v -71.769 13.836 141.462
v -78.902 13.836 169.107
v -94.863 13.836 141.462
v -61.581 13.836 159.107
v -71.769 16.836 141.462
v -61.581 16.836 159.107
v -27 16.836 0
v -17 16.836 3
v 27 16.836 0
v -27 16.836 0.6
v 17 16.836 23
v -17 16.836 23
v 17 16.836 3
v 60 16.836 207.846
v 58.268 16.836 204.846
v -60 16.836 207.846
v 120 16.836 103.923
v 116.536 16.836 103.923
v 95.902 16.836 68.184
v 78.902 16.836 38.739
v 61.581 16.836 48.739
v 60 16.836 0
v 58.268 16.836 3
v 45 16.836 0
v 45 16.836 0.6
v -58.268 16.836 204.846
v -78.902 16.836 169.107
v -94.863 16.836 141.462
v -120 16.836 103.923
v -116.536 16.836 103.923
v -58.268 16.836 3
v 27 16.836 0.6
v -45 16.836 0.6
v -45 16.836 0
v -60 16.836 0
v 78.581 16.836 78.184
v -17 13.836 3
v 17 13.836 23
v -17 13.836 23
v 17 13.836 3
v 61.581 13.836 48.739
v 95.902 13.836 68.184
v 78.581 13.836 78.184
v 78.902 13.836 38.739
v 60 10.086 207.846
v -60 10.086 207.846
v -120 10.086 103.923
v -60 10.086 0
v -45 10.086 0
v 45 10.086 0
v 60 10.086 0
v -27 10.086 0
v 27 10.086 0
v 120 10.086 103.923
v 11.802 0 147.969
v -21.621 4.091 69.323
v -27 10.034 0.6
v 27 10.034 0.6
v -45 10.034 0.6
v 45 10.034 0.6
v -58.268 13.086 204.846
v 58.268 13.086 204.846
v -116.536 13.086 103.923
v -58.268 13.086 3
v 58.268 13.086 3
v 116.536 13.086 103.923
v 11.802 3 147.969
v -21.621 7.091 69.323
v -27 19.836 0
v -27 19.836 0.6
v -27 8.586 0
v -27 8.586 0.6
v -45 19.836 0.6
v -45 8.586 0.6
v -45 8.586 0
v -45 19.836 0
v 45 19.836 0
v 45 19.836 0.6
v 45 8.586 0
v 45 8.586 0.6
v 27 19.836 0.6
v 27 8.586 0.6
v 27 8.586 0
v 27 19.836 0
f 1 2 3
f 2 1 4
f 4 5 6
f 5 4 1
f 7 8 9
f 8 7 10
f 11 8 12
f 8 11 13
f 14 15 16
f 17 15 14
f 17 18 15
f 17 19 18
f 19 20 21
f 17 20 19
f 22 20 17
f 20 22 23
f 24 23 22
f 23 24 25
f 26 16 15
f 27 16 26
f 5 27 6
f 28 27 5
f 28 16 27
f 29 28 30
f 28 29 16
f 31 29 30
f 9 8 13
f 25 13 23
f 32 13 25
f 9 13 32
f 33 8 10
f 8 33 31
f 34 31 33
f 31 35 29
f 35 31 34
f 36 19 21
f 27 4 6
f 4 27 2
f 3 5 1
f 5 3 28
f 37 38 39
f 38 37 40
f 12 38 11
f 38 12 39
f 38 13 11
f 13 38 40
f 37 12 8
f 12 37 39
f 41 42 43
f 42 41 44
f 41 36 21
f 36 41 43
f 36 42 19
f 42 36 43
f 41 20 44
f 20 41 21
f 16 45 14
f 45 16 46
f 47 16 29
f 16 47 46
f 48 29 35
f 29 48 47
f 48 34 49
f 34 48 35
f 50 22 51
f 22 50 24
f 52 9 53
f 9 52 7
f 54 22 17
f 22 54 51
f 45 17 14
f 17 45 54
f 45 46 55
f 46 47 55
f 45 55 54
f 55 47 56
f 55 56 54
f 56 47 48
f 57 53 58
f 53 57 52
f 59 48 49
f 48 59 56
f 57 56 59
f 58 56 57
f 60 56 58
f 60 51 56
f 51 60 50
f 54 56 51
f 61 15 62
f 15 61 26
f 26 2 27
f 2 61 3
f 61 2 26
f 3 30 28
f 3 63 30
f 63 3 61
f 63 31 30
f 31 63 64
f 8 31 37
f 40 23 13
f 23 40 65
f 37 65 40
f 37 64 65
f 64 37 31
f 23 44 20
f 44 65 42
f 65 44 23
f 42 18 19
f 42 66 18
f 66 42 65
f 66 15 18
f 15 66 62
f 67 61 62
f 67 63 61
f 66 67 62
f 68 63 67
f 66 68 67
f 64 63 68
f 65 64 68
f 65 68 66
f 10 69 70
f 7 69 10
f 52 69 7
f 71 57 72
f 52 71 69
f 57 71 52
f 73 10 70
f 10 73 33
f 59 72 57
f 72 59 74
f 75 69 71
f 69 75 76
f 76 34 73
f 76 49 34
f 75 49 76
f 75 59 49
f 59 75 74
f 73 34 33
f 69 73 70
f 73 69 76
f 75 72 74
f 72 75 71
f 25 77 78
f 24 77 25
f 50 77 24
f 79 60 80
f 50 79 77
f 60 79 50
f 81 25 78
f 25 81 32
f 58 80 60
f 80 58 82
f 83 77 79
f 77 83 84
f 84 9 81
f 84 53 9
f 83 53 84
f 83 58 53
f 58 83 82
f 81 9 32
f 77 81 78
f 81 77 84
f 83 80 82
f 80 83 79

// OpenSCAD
/*
    parametric_faceted_hex_wall_tile_mount_v29_self_supporting_mounts.scad
    ----------------------------------------------------------------
    Regular asymmetric low-poly hex wall tile.

    v29 goals
    ---------
    1. Multi-object plate packing is the default design target.
    2. Preserve a TRUE regular hexagon -- no X/Y stretching.
    3. Default maximum corner-to-corner width = 240 mm / 9.449 in.
    4. Vertical export rests on a complete flat hex side, not a point.
    5. Open back remains fully open.
    6. Hidden mounting pads remain clipped below the visible face.
    7. One master thickness controls shell, perimeter, and pads.
    8. Integrated low-profile sacrificial stabilizer feet are enabled by default.
    9. Mounting pads are automatically beveled for the selected vertical
       orientation so their first printed layer begins at the perimeter wall.
    10. This removes the need for tall fins or diagonal sacrificial gussets.
    11. The rear mounting surface remains flat; only the pad footprint is trimmed
        where needed to eliminate print-island starts.

    Recommended default
    -------------------
    face_size_reference      = "across_corners";
    face_size_units          = "mm";
    face_size                = 240.0;   // 9.449" maximum width

    tile_rotation_deg        = 15;

    export_orientation       = "vertical";
    vertical_edge_angle_deg  = 15;      // flat side on build plate

    master_thickness_mm      = 3.0;
    add_mount_pads           = true;
    add_mount_ribs           = false;

    // Multi-copy stability:
    add_vertical_breakaway_feet = true;
    vertical_foot_depth_mm       = 5.0;
    vertical_foot_height_mm      = 0.60;
    vertical_foot_neck_mm        = 0.80;

    Export
    ------
    F6 Render
    File -> Export -> Export as STL
*/


// =============================================================================
// CUSTOMIZER PARAMETERS
// =============================================================================


/* [Finished Face Size] */

// "bounding_square"
//     face_size is the maximum X and Y envelope.
//
// "flat_to_flat"
//     face_size is the traditional hex flat-to-flat dimension.
//
// "across_corners"
//     face_size is the regular-hex corner-to-corner dimension.
//
// v29 DEFAULT:
// across_corners = 240 mm so the vertically printed tile is about:
//     X = 240.0 mm
//     Z = 207.85 mm
// while resting on a complete flat edge.
face_size_reference = "across_corners"; // [bounding_square, flat_to_flat, across_corners]

// Units used by face_size.
face_size_units = "mm";                   // [mm, in]

// Default = 240 mm / 9.449 in maximum corner-to-corner width.
// This leaves useful X-axis margin on a 256 mm plate.
face_size = 240.0;

// Rotation of the finished hex within its face plane.
//
// IMPORTANT:
// 15 degrees gives a regular hex an equal X/Y bounding envelope.
// With bounding_square + 254 mm this produces approximately:
//     X = 254.0 mm
//     Y = 254.0 mm
tile_rotation_deg = 15;


/* [Export / Print Orientation] */

// "flat"     = conventional CAD orientation; decorative face points +Z.
// "vertical" = rotate final part onto an edge for vertical printing.
export_orientation = "vertical";          // [flat, vertical]

// Additional in-plane rotation used ONLY before standing the part vertically.
//
// IMPORTANT:
// The finished face uses tile_rotation_deg = 15 so its X/Y envelope is exactly
// square. A regular hex rests on a FLAT SIDE when its effective print-plane
// rotation is 30 degrees (modulo 60 degrees).
//
// Therefore the default vertical export adds another 15 degrees:
//
//     15 deg finished-face rotation
//   + 15 deg vertical export rotation
//   = 30 deg effective print rotation
//
// This puts a complete flat hex side on the build plate instead of a point.
// The transformed model is automatically translated so that side rests at Z=0.
// Rotate the finished 15-degree face orientation another 15 degrees before
// standing it up. 15 + 15 = 30 degrees, which places a complete hex side
// horizontally at the bottom rather than balancing the tile on a vertex.
vertical_edge_angle_deg = 15;

// Add small breakaway stabilizer feet after the model is stood vertically.
// Normally leave OFF and use a slicer brim if required.
add_vertical_breakaway_feet = true;

// Breakaway-foot dimensions.
vertical_foot_length_mm = 18.0;
vertical_foot_depth_mm = 5.0;
vertical_foot_height_mm = 0.60;
vertical_foot_neck_mm = 0.80;


/* [MASTER THICKNESS] */

// Main material thickness control.
master_thickness_mm = 3.0;

// Optional tuning multipliers.
front_shell_multiplier = 1.0;
perimeter_multiplier   = 1.0;
mount_pad_multiplier   = 1.0;


/* [Front Relief] */

// "proportional" scales relief with the true flat-to-flat dimension.
// "absolute" uses explicit millimeter values.
relief_height_mode = "proportional";      // [proportional, absolute]

relief_scale = 1.0;

// Relative relief proportions.
peak_height_ratio = 0.081;
ridge_to_peak_ratio = 0.757;
edge_to_peak_ratio = 0.097;

// Used only in absolute mode.
peak_height_mm   = 18.5;
ridge_height_mm = 14.0;
edge_height_mm  = 1.8;

// Minimum air gap between inner roof and mounting geometry.
edge_clearance_mm = 0.60;


/* [Facet Layout] */

peak_angle_deg = 45;
peak_radius_ratio = 0.38;

ridge_angle_deg = 208;
ridge_radius_ratio = 0.34;


/* [Wall Mounting] */

add_mount_pads = true;

// Width parallel to local hex edge.
mount_pad_width_mm = 34.0;

// Radial depth into the cavity.
mount_pad_depth_mm = 24.0;

// Structural overlap beneath the inner perimeter shell.
mount_pad_overlap_mm = 4.0;

// Pull mounting geometry inward from the visible outside perimeter.
 // Keep this smaller than the perimeter-wall thickness so the pad still
 // overlaps the wall by a positive amount.
// IMPORTANT:
 // Must be LESS than perimeter_wall_thickness_mm so the pads physically
 // overlap the perimeter wall and become one connected solid.
 mount_pad_edge_inset_mm = 0.5;

// Clearance below underside of visible face.
mount_face_clearance_mm = 0.75;

// Mount-pad directions in the tile's local coordinate system.
mount_pad_angles = [60, 120, 240, 300];


/* [Mount Reinforcement] */

add_mount_ribs = false;

mount_rib_width_mm  = 3.0;
mount_rib_height_mm = 5.0;
mount_rib_depth_mm  = 8.0;


/* [Optional Screw Holes] */

add_pad_screw_holes = false;

pad_screw_hole_diameter_mm = 4.5;



/* [Plate Packing Guidance] */

// These values do NOT duplicate objects inside the STL.
// They provide planning numbers in the OpenSCAD console for arranging
// multiple copies in the slicer.
//
// Typical X2D-style plate planning:
//   usable Y = 256 mm
//   keep a conservative front/rear margin
plate_depth_mm = 256.0;

plate_front_margin_mm = 8.0;
plate_rear_margin_mm  = 8.0;

// Recommended empty gap between adjacent standing tiles.
// Increase if using aggressive acceleration or if the printer has noticeable
// resonance/wobble on tall parts.
recommended_inter_tile_gap_mm = 8.0;

// Feet extend from Y=0 to vertical_foot_depth_mm.
// The actual tile relief occupies approximately peak_height in Y.
// Packing pitch uses whichever is deeper, plus the inter-tile gap.


/* [Vertical Self-Supporting Mount Pads] */

// Recommended ON for vertical printing.
//
// Each rectangular mounting-pad footprint is clipped by a print-height
// half-space. The cut removes only the portion that would begin below the
// pad's wall-connected outer edge. As a result, every pad grows outward from
// the already-printing perimeter rather than appearing as a mid-air island.
make_mount_pads_vertical_self_supporting = true;

// Small amount below the wall-connected outer-edge start height that is kept.
// 0.20 mm is approximately one standard layer and helps guarantee overlap.
mount_pad_print_safety_mm = 0.20;

// Large half-space size used only for clipping.
print_halfspace_size_mm = 1000.0;


/* [Vertical Anti-Float Gussets] */

// Some mounting pads begin above the build plate when the tile is printed
// vertically. Instead of a tall free-standing fin, v28 generates a short,
// diagonal sacrificial gusset from the already-printed perimeter wall toward
// the lowest corner of each affected pad.
//
// The gusset:
// - stays inside the rear cavity
// - is thin in Y for easy removal
// - grows from the shell toward the pad
// - is generated only for pads that would otherwise start as an island
add_vertical_antifloat_gussets = false;

// Thin sacrificial thickness into the cavity.
antifloat_gusset_thickness_mm = 0.70;

// How far the gusset extends into the pad for reliable layer connection.
antifloat_gusset_pad_overlap_mm = 1.50;

// Vertical distance below the first pad layer used for the shell-side anchor.
// A 30 mm drop keeps the diagonal print angle conservative while remaining
// dramatically shorter than the previous full-height support fins.
antifloat_gusset_drop_mm = 30.0;

// Height of the short attachment edge against the perimeter wall.
antifloat_gusset_wall_base_mm = 5.0;

// Keep the wall anchor slightly inside the visible outer perimeter.
antifloat_gusset_wall_inset_mm = 1.5;

// Ignore a pad if its lowest point is already essentially on the build plate.
antifloat_min_height_mm = 0.80;


/* [Advanced] */

polyhedron_convexity = 12;
screw_hole_fn = 40;

// Small numerical tolerance.
eps = 0.01;


// =============================================================================
// HELPERS
// =============================================================================

function polar(angle_deg, radius) =
    [
        radius * cos(angle_deg),
        radius * sin(angle_deg)
    ];

function hex_vertex_unrotated(i, radius) =
    [
        radius * cos(30 + i * 60),
        radius * sin(30 + i * 60)
    ];

function rotate2d(p, angle_deg) =
    [
        p[0] * cos(angle_deg) - p[1] * sin(angle_deg),
        p[0] * sin(angle_deg) + p[1] * cos(angle_deg)
    ];


// Position of a raw mount-pad corner after all in-plane rotations used by the
// vertical export. Returned as [final_X, final_Z] because after rotate X=90,
// original in-plane Y becomes print Z.
function mount_print_corner(angle_deg, radial_r, lateral_t) =
    let(
        theta =
            angle_deg
            + tile_rotation_deg
            + vertical_edge_angle_deg
    )
    [
        radial_r * cos(theta) - lateral_t * sin(theta),
        vertical_half_y
            + radial_r * sin(theta)
            + lateral_t * cos(theta)
    ];

function mount_print_corners(angle_deg) =
    [
        mount_print_corner(
            angle_deg,
            mount_pad_inner_r,
            -mount_pad_width_mm / 2
        ),
        mount_print_corner(
            angle_deg,
            mount_pad_inner_r,
             mount_pad_width_mm / 2
        ),
        mount_print_corner(
            angle_deg,
            mount_pad_desired_outer_r,
            -mount_pad_width_mm / 2
        ),
        mount_print_corner(
            angle_deg,
            mount_pad_desired_outer_r,
             mount_pad_width_mm / 2
        )
    ];

function mount_corner_z_values(angle_deg) =
    [
        for (p = mount_print_corners(angle_deg))
            p[1]
    ];

function mount_lowest_z(angle_deg) =
    min(mount_corner_z_values(angle_deg));

function mount_lowest_corner_index(angle_deg) =
    search(
        mount_lowest_z(angle_deg),
        mount_corner_z_values(angle_deg)
    )[0];

function mount_lowest_x(angle_deg) =
    mount_print_corners(angle_deg)[
        mount_lowest_corner_index(angle_deg)
    ][0];


function mount_outer_print_z_values(angle_deg) =
    [
        mount_print_corner(
            angle_deg,
            mount_pad_desired_outer_r,
            -mount_pad_width_mm / 2
        )[1],

        mount_print_corner(
            angle_deg,
            mount_pad_desired_outer_r,
             mount_pad_width_mm / 2
        )[1]
    ];

function mount_outer_lowest_z(angle_deg) =
    min(mount_outer_print_z_values(angle_deg));



// Half-width of the stood-up regular hex at a given print Z.
//
// In the default flat-side-down vertical orientation:
// - bottom/top edges are flat
// - maximum width is across corners
// - total print height is flat-to-flat
//
// This lets the sacrificial gusset anchor itself directly into the perimeter
// wall at the same side of the tile as the affected mounting pad.
function vertical_hex_half_width_at_z(z_mm) =
    let(
        zc = min(max(z_mm, 0), vertical_print_height),
        dz = min(zc, vertical_print_height - zc)
    )
    hex_side_length / 2 + dz / tan(60);

function hex_vertex(i, radius) =
    rotate2d(
        hex_vertex_unrotated(i, radius),
        tile_rotation_deg
    );

// Half-width / half-height of a unit-circumradius rotated regular hex.
function unit_hex_half_x(rotation_deg) =
    max([
        for (i = [0 : 5])
            abs(
                cos(30 + i * 60 + rotation_deg)
            )
    ]);

function unit_hex_half_y(rotation_deg) =
    max([
        for (i = [0 : 5])
            abs(
                sin(30 + i * 60 + rotation_deg)
            )
    ]);

// Bounding box of a regular hex with circumradius r.
function hex_bbox_x(r, rotation_deg) =
    2 * r * unit_hex_half_x(rotation_deg);

function hex_bbox_y(r, rotation_deg) =
    2 * r * unit_hex_half_y(rotation_deg);


// =============================================================================
// DERIVED MATERIAL THICKNESSES
// =============================================================================

front_shell_thickness_mm =
    master_thickness_mm * front_shell_multiplier;

perimeter_wall_thickness_mm =
    master_thickness_mm * perimeter_multiplier;

mount_pad_thickness_mm =
    master_thickness_mm * mount_pad_multiplier;


// =============================================================================
// DERIVED FACE DIMENSIONS
// =============================================================================

_face_size_mm =
    face_size_units == "in"
        ? face_size * 25.4
        : face_size;

// If bounding_square is selected, choose the largest regular-hex radius that
// fits inside both the requested X and Y dimensions.
//
// At tile_rotation_deg = 15, unit X and Y extents are equal, so both dimensions
// become exactly face_size.
r_outer =
    face_size_reference == "flat_to_flat"
        ? (_face_size_mm / 2) / cos(30)
        : face_size_reference == "across_corners"
            ? _face_size_mm / 2
            : min(
                _face_size_mm / (2 * unit_hex_half_x(tile_rotation_deg)),
                _face_size_mm / (2 * unit_hex_half_y(tile_rotation_deg))
              );

tile_flat_to_flat =
    2 * r_outer * cos(30);

tile_across_corners =
    2 * r_outer;

finished_bbox_x =
    hex_bbox_x(r_outer, tile_rotation_deg);

finished_bbox_y =
    hex_bbox_y(r_outer, tile_rotation_deg);

outer_apothem =
    tile_flat_to_flat / 2;

inner_apothem =
    outer_apothem - perimeter_wall_thickness_mm;

r_inner =
    inner_apothem / cos(30);

inner_flat_length =
    2 * inner_apothem * tan(30);

hex_side_length =
    r_outer;


// =============================================================================
// DERIVED RELIEF HEIGHTS
// =============================================================================

_peak_unscaled =
    relief_height_mode == "proportional"
        ? tile_flat_to_flat * peak_height_ratio
        : peak_height_mm;

_ridge_unscaled =
    relief_height_mode == "proportional"
        ? _peak_unscaled * ridge_to_peak_ratio
        : ridge_height_mm;

_requested_edge_unscaled =
    relief_height_mode == "proportional"
        ? _peak_unscaled * edge_to_peak_ratio
        : edge_height_mm;

peak_height =
    _peak_unscaled * relief_scale;

ridge_height =
    _ridge_unscaled * relief_scale;

requested_edge_height =
    _requested_edge_unscaled * relief_scale;

// Enough vertical room for front shell + complete pad + clearance.
minimum_edge_height =
    front_shell_thickness_mm
    + mount_pad_thickness_mm
    + mount_face_clearance_mm;

edge_height =
    max(
        requested_edge_height,
        minimum_edge_height
    );


// =============================================================================
// DERIVED MOUNTING GEOMETRY
// =============================================================================

mount_pad_desired_outer_r =
    inner_apothem + mount_pad_overlap_mm;

mount_pad_inner_r =
    mount_pad_desired_outer_r - mount_pad_depth_mm;

mount_pad_center_r =
    mount_pad_desired_outer_r - mount_pad_depth_mm / 2;

mount_clip_apothem =
    outer_apothem - mount_pad_edge_inset_mm;

mount_clip_radius =
    mount_clip_apothem / cos(30);


// =============================================================================
// VERTICAL-EXPORT DERIVED VALUES
// =============================================================================
//
// The tile is first rotated around Z by vertical_edge_angle_deg, then stood up
// by +90 degrees around X.
//
// We calculate the local Y envelope AFTER that optional Z rotation so the
// final model can be translated to put its lowest point exactly on Z=0.

vertical_rotation_total_deg =
    vertical_edge_angle_deg;

vertical_half_y =
    max([
        for (i = [0 : 5])
            abs(
                r_outer
                * sin(
                    30
                    + i * 60
                    + tile_rotation_deg
                    + vertical_rotation_total_deg
                )
            )
    ]);

vertical_print_height =
    2 * vertical_half_y;

// After rotate([90,0,0]), original +Z becomes -Y.
// Translate by peak_height so all relief lies in positive Y.
vertical_print_depth =
    peak_height;

// Multi-copy packing envelope in Y.
//
// vertical_tile() occupies approximately peak_height of Y-depth.
// Breakaway feet occupy vertical_foot_depth_mm.
// Use the larger dimension as the per-part physical depth.
vertical_object_depth =
    add_vertical_breakaway_feet
        ? vertical_print_depth + 3.0
        : vertical_print_depth;

recommended_copy_pitch_y =
    vertical_object_depth + recommended_inter_tile_gap_mm;

usable_plate_depth =
    plate_depth_mm
    - plate_front_margin_mm
    - plate_rear_margin_mm;

estimated_copies_per_plate_depth =
    max(
        1,
        floor(
            (
                usable_plate_depth
                + recommended_inter_tile_gap_mm
            )
            / recommended_copy_pitch_y
        )
    );


// =============================================================================
// VALIDATION
// =============================================================================

assert(
    _face_size_mm > 0,
    "face_size must produce a positive dimension."
);

assert(
    master_thickness_mm > 0,
    "master_thickness_mm must be greater than zero."
);

assert(
    front_shell_multiplier > 0
    && perimeter_multiplier > 0
    && mount_pad_multiplier > 0,
    "All thickness multipliers must be greater than zero."
);

assert(
    front_shell_thickness_mm > 0,
    "front_shell_thickness_mm must be greater than zero."
);

assert(
    perimeter_wall_thickness_mm > 0,
    "perimeter_wall_thickness_mm must be greater than zero."
);

assert(
    perimeter_wall_thickness_mm < outer_apothem,
    "perimeter_wall_thickness_mm is too large for this tile."
);

assert(
    inner_apothem > 0,
    "The selected perimeter wall leaves no hollow interior."
);

assert(
    edge_height > front_shell_thickness_mm,
    "Internal error: edge_height must exceed front_shell_thickness_mm."
);

assert(
    ridge_height > edge_height,
    "ridge_height must remain greater than the effective edge height."
);

assert(
    peak_height > ridge_height,
    "peak_height must remain greater than ridge_height."
);

assert(
    peak_radius_ratio > 0 && peak_radius_ratio < 0.90,
    "peak_radius_ratio must be between 0 and 0.90."
);

assert(
    ridge_radius_ratio > 0 && ridge_radius_ratio < 0.90,
    "ridge_radius_ratio must be between 0 and 0.90."
);

assert(
    mount_pad_width_mm > 0,
    "mount_pad_width_mm must be greater than zero."
);

assert(
    mount_pad_depth_mm > 0,
    "mount_pad_depth_mm must be greater than zero."
);

assert(
    mount_pad_thickness_mm > 0,
    "mount_pad_thickness_mm must be greater than zero."
);

assert(
    mount_pad_overlap_mm >= 0,
    "mount_pad_overlap_mm cannot be negative."
);

assert(
    mount_pad_edge_inset_mm >= 0,
    "mount_pad_edge_inset_mm cannot be negative."
);

assert(
    mount_pad_edge_inset_mm < perimeter_wall_thickness_mm,
    "mount_pad_edge_inset_mm must be smaller than perimeter_wall_thickness_mm so mounting pads overlap and join the perimeter wall."
);

assert(
    mount_face_clearance_mm >= 0,
    "mount_face_clearance_mm cannot be negative."
);

assert(
    mount_clip_apothem > 0,
    "mount_pad_edge_inset_mm is too large."
);

assert(
    mount_pad_inner_r > 0,
    "mount_pad_depth_mm is too large and reaches/passes the tile center."
);

assert(
    !add_pad_screw_holes
    || pad_screw_hole_diameter_mm < mount_pad_width_mm * 0.75,
    "pad_screw_hole_diameter_mm is too large for the mounting pad."
);

assert(
    !add_mount_ribs
    || mount_rib_height_mm > 0,
    "mount_rib_height_mm must be greater than zero."
);

assert(
    !add_vertical_breakaway_feet
    || export_orientation == "vertical",
    "Vertical breakaway feet require export_orientation = \"vertical\"."
);

assert(
    plate_depth_mm > 0,
    "plate_depth_mm must be greater than zero."
);

assert(
    plate_front_margin_mm >= 0
    && plate_rear_margin_mm >= 0,
    "Plate margins cannot be negative."
);

assert(
    recommended_inter_tile_gap_mm >= 0,
    "recommended_inter_tile_gap_mm cannot be negative."
);

assert(
    usable_plate_depth > 0,
    "Plate margins leave no usable plate depth."
);


assert(
    antifloat_gusset_thickness_mm > 0
    && antifloat_gusset_thickness_mm <= mount_pad_thickness_mm,
    "antifloat_gusset_thickness_mm must be > 0 and no thicker than the mounting pad."
);

assert(
    antifloat_gusset_pad_overlap_mm > 0,
    "antifloat_gusset_pad_overlap_mm must be greater than zero."
);

assert(
    antifloat_gusset_drop_mm > 0,
    "antifloat_gusset_drop_mm must be greater than zero."
);

assert(
    antifloat_gusset_wall_base_mm > 0,
    "antifloat_gusset_wall_base_mm must be greater than zero."
);

assert(
    antifloat_gusset_wall_inset_mm >= 0,
    "antifloat_gusset_wall_inset_mm cannot be negative."
);


assert(
    mount_pad_print_safety_mm >= 0,
    "mount_pad_print_safety_mm cannot be negative."
);

assert(
    print_halfspace_size_mm > tile_across_corners * 2,
    "print_halfspace_size_mm is too small for the tile."
);


// =============================================================================
// DIAGNOSTIC OUTPUT
// =============================================================================

echo("====================================================");
echo("FACETED HEX WALL TILE v29 - MULTI-PLATE / SELF-SUPPORTING MOUNTS");
echo("====================================================");

echo(str("face size reference      : ", face_size_reference));
echo(str("requested face size      : ", _face_size_mm, " mm"));
echo(str("tile rotation            : ", tile_rotation_deg, " deg"));

echo(str("finished bbox X          : ", finished_bbox_x, " mm"));
echo(str("finished bbox Y          : ", finished_bbox_y, " mm"));
echo(str("finished bbox X inches   : ", finished_bbox_x / 25.4, " in"));
echo(str("finished bbox Y inches   : ", finished_bbox_y / 25.4, " in"));

echo(str("flat-to-flat             : ", tile_flat_to_flat, " mm"));
echo(str("across-corners           : ", tile_across_corners, " mm"));
echo(str("hex side length          : ", hex_side_length, " mm"));

echo(str("MASTER thickness         : ", master_thickness_mm, " mm"));
echo(str("actual front shell       : ", front_shell_thickness_mm, " mm"));
echo(str("actual perimeter wall    : ", perimeter_wall_thickness_mm, " mm"));
echo(str("actual mount pad         : ", mount_pad_thickness_mm, " mm"));

echo(str("requested edge height    : ", requested_edge_height, " mm"));
echo(str("minimum edge height      : ", minimum_edge_height, " mm"));
echo(str("EFFECTIVE edge height    : ", edge_height, " mm"));

echo(str("ridge height             : ", ridge_height, " mm"));
echo(str("peak height              : ", peak_height, " mm"));
echo(str("peak height inches       : ", peak_height / 25.4, " in"));

echo(str("mount pad width          : ", mount_pad_width_mm, " mm"));
echo(str("mount pad depth          : ", mount_pad_depth_mm, " mm"));
echo(str("mount pad thickness      : ", mount_pad_thickness_mm, " mm"));
echo(str("mount pad overlap        : ", mount_pad_overlap_mm, " mm"));
echo(str("mount edge inset         : ", mount_pad_edge_inset_mm, " mm"));
echo(str("mount/face clearance     : ", mount_face_clearance_mm, " mm"));

echo(str("export orientation       : ", export_orientation));

if (
    export_orientation == "vertical"
    && add_mount_pads
    && add_vertical_antifloat_gussets
) {
    for (a = mount_pad_angles)
        echo(
            str(
                "mount pad ",
                a,
                " deg lowest print Z : ",
                mount_lowest_z(a),
                " mm"
            )
        );

        echo(
            str(
                "mount pad ",
                a,
                " deg wall-start Z   : ",
                mount_outer_lowest_z(a),
                " mm"
            )
        );
}

echo(str("vertical extra rotation  : ", vertical_edge_angle_deg, " deg"));
echo(str("effective print rotation : ",
         tile_rotation_deg + vertical_edge_angle_deg, " deg"));

if (export_orientation == "vertical"
    && abs(
        ((tile_rotation_deg + vertical_edge_angle_deg) % 60) - 30
    ) < 0.001)
    echo("build-plate contact      : FLAT HEX SIDE");
else if (export_orientation == "vertical")
    echo("build-plate contact      : WARNING - NOT EXACTLY FLAT-SIDE DOWN");

if (export_orientation == "vertical") {
    echo(str("vertical print height    : ", vertical_print_height, " mm"));
    echo(str("vertical relief depth    : ", vertical_print_depth, " mm"));
    echo(str("vertical object depth    : ", vertical_object_depth, " mm"));
    echo(str("recommended Y gap        : ", recommended_inter_tile_gap_mm, " mm"));
    echo(str("recommended Y pitch      : ", recommended_copy_pitch_y, " mm"));
    echo(str("usable plate Y depth     : ", usable_plate_depth, " mm"));
    echo(str("estimated copies in Y    : ", estimated_copies_per_plate_depth));
}

if (edge_height > requested_edge_height)
    echo(
        str(
            "AUTO EDGE FIX ACTIVE: edge raised from ",
            requested_edge_height,
            " mm to ",
            edge_height,
            " mm."
        )
    );

echo("====================================================");


// =============================================================================
// FRONT RELIEF CONTROL POINTS
// =============================================================================

P_xy =
    polar(
        peak_angle_deg + tile_rotation_deg,
        r_outer * peak_radius_ratio
    );

Q_xy =
    polar(
        ridge_angle_deg + tile_rotation_deg,
        r_outer * ridge_radius_ratio
    );


// =============================================================================
// SHELL VERTICES
// =============================================================================

points =
    concat(

        // 0..5 : outer rear perimeter
        [
            for (i = [0 : 5])
                let(p = hex_vertex(i, r_outer))
                [p[0], p[1], 0]
        ],

        // 6..11 : outer front perimeter
        [
            for (i = [0 : 5])
                let(p = hex_vertex(i, r_outer))
                [p[0], p[1], edge_height]
        ],

        // 12..13 : outer peak / ridge
        [
            [P_xy[0], P_xy[1], peak_height],
            [Q_xy[0], Q_xy[1], ridge_height]
        ],

        // 14..19 : inner rear perimeter
        [
            for (i = [0 : 5])
                let(p = hex_vertex(i, r_inner))
                [p[0], p[1], 0]
        ],

        // 20..25 : inner front perimeter
        [
            for (i = [0 : 5])
                let(p = hex_vertex(i, r_inner))
                [p[0], p[1], edge_height - front_shell_thickness_mm]
        ],

        // 26..27 : inner peak / ridge
        [
            [
                P_xy[0],
                P_xy[1],
                peak_height - front_shell_thickness_mm
            ],
            [
                Q_xy[0],
                Q_xy[1],
                ridge_height - front_shell_thickness_mm
            ]
        ]
    );


// =============================================================================
// SHELL FACES
// =============================================================================

outer_roof_faces = [
    [6, 7, 12],
    [7, 8, 12],
    [6, 12, 11],

    [8, 13, 12],
    [11, 12, 13],

    [8, 9, 13],
    [9, 10, 13],
    [10, 11, 13]
];

inner_roof_faces = [
    [26, 21, 20],
    [26, 22, 21],
    [25, 26, 20],

    [26, 27, 22],
    [27, 26, 25],

    [27, 23, 22],
    [27, 24, 23],
    [27, 25, 24]
];

faces =
    concat(

        // Outer vertical perimeter
        [
            for (i = [0 : 5])
                [
                    i,
                    (i + 1) % 6,
                    6 + (i + 1) % 6,
                    6 + i
                ]
        ],

        outer_roof_faces,

        // Inner vertical perimeter
        [
            for (i = [0 : 5])
                [
                    14 + i,
                    20 + i,
                    20 + (i + 1) % 6,
                    14 + (i + 1) % 6
                ]
        ],

        inner_roof_faces,

        // Narrow rear perimeter ring only.
        // Center remains fully open.
        [
            for (i = [0 : 5])
                [
                    i,
                    14 + i,
                    14 + (i + 1) % 6,
                    (i + 1) % 6
                ]
        ]
    );


// =============================================================================
// TILE SHELL
// =============================================================================

module tile_shell() {
    polyhedron(
        points = points,
        faces = faces,
        convexity = polyhedron_convexity
    );
}


// =============================================================================
// SAFE MOUNTING VOLUME BELOW FRONT FACE
// =============================================================================

safe_edge_z =
    max(
        eps,
        edge_height
        - front_shell_thickness_mm
        - mount_face_clearance_mm
    );

safe_peak_z =
    max(
        eps,
        peak_height
        - front_shell_thickness_mm
        - mount_face_clearance_mm
    );

safe_ridge_z =
    max(
        eps,
        ridge_height
        - front_shell_thickness_mm
        - mount_face_clearance_mm
    );

safe_mount_points =
    concat(

        // 0..5 : rear outer perimeter
        [
            for (i = [0 : 5])
                let(p = hex_vertex(i, r_outer))
                [p[0], p[1], 0]
        ],

        // 6..11 : safe ceiling at outer perimeter
        [
            for (i = [0 : 5])
                let(p = hex_vertex(i, r_outer))
                [p[0], p[1], safe_edge_z]
        ],

        // 12..13 : safe ceiling under peak/ridge
        [
            [P_xy[0], P_xy[1], safe_peak_z],
            [Q_xy[0], Q_xy[1], safe_ridge_z]
        ]
    );

safe_mount_ceiling_faces = [
    [6, 7, 12],
    [7, 8, 12],
    [6, 12, 11],
    [8, 13, 12],
    [11, 12, 13],
    [8, 9, 13],
    [9, 10, 13],
    [10, 11, 13]
];

safe_mount_faces =
    concat(

        // Outer side walls.
        [
            for (i = [0 : 5])
                [
                    i,
                    (i + 1) % 6,
                    6 + (i + 1) % 6,
                    6 + i
                ]
        ],

        // Sloped safe ceiling.
        safe_mount_ceiling_faces,

        // Rear floor used only to close clipping volume.
        [[5, 4, 3, 2, 1, 0]]
    );

module safe_mount_volume() {
    polyhedron(
        points = safe_mount_points,
        faces = safe_mount_faces,
        convexity = polyhedron_convexity
    );
}


// =============================================================================
// HEX FOOTPRINT FOR MOUNT CLIPPING
// =============================================================================

module mount_clip_volume(height_mm) {
    linear_extrude(height = height_mm)
        polygon(
            points = [
                for (i = [0 : 5])
                    hex_vertex(i, mount_clip_radius)
            ]
        );
}


// =============================================================================
// PRINT-HEIGHT HALF-SPACE FOR SELF-SUPPORTING MOUNT PADS
// =============================================================================
//
// final_print_Z = vertical_half_y + Y_after_vertical_edge_rotation
//
// This module creates the inverse-transformed half-space:
//     final_print_Z >= min_print_z
//
// Intersecting a raw mounting pad with this volume trims only the portion that
// would begin printing before the pad reaches its wall-connected outer edge.

module print_z_halfspace(min_print_z) {

    threshold_y =
        min_print_z - vertical_half_y;

    rotate([0, 0, -vertical_edge_angle_deg])

        translate(
            [
                -print_halfspace_size_mm,
                threshold_y,
                -print_halfspace_size_mm
            ]
        )

            cube(
                [
                    print_halfspace_size_mm * 2,
                    print_halfspace_size_mm * 2,
                    print_halfspace_size_mm * 2
                ]
            );
}


// =============================================================================
// RAW MOUNT PAD
// =============================================================================
//
// Mount-pad angles are local tile angles. tile_rotation_deg is applied so the
// pads remain attached to the same visual positions when the face rotates.

module raw_mount_pad(angle_deg) {
    rotate([0, 0, angle_deg + tile_rotation_deg])
        translate(
            [
                mount_pad_inner_r,
                -mount_pad_width_mm / 2,
                0
            ]
        )
            cube(
                [
                    mount_pad_depth_mm,
                    mount_pad_width_mm,
                    mount_pad_thickness_mm
                ]
            );
}


// =============================================================================
// CLIPPED MOUNT PAD
// =============================================================================

module mount_pad(angle_deg) {

    intersection() {

        raw_mount_pad(angle_deg);

        // Keep pad inside inset hex footprint while still penetrating the
        // perimeter wall enough to form a robust union.
        mount_clip_volume(
            mount_pad_thickness_mm + eps
        );

        // Hard stop below underside of front shell.
        safe_mount_volume();

        // Vertical-print island prevention.
        //
        // Clip away any pad footprint that would appear before the pad reaches
        // its wall-connected outer edge. This makes the pad self-supporting in
        // the selected flat-side-down print orientation.
        if (
            export_orientation == "vertical"
            && make_mount_pads_vertical_self_supporting
        )
            print_z_halfspace(
                mount_outer_lowest_z(angle_deg)
                - mount_pad_print_safety_mm
            );
    }
}


// =============================================================================
// OPTIONAL REINFORCING RIBS
// =============================================================================

module raw_mount_ribs(angle_deg) {

    rib_center_r =
        mount_pad_desired_outer_r
        - mount_rib_depth_mm / 2;

    rib_side_offset =
        max(
            0,
            mount_pad_width_mm / 2
            - mount_rib_width_mm
            - 2
        );

    rotate([0, 0, angle_deg + tile_rotation_deg]) {

        for (side = [-1, 1]) {

            translate(
                [
                    rib_center_r - mount_rib_depth_mm / 2,
                    side * rib_side_offset - mount_rib_width_mm / 2,
                    mount_pad_thickness_mm
                ]
            )

            rotate([90, 0, 90])

            linear_extrude(height = mount_rib_depth_mm)

            polygon(
                points = [
                    [0, 0],
                    [mount_rib_width_mm, 0],
                    [mount_rib_width_mm, mount_rib_height_mm],
                    [0, 0]
                ]
            );
        }
    }
}

module mount_ribs(angle_deg) {
    intersection() {

        raw_mount_ribs(angle_deg);

        mount_clip_volume(
            mount_pad_thickness_mm
            + mount_rib_height_mm
            + 0.1
        );

        safe_mount_volume();
    }
}


// =============================================================================
// OPTIONAL SCREW HOLE
// =============================================================================

module pad_screw_hole(angle_deg) {

    rotate([0, 0, angle_deg + tile_rotation_deg])

        translate(
            [
                mount_pad_center_r,
                0,
                -1
            ]
        )

            cylinder(
                d = pad_screw_hole_diameter_mm,
                h =
                    mount_pad_thickness_mm
                    + mount_rib_height_mm
                    + 2,
                $fn = screw_hole_fn
            );
}


// =============================================================================
// COMPLETE FINISHED TILE
// =============================================================================

module finished_tile() {

    difference() {

        union() {

            tile_shell();

            if (add_mount_pads) {

                for (a = mount_pad_angles) {

                    mount_pad(a);

                    if (add_mount_ribs)
                        mount_ribs(a);
                }
            }
        }

        if (
            add_mount_pads
            && add_pad_screw_holes
        ) {

            for (a = mount_pad_angles)
                pad_screw_hole(a);
        }
    }
}


// =============================================================================
// VERTICAL-PRINT TRANSFORM
// =============================================================================
//
// Transform order in OpenSCAD is inside-out:
//
// 1. finished_tile()
// 2. optional extra Z rotation for selecting another edge
// 3. rotate +90 degrees around X so the face stands vertically
// 4. translate so:
//      - relief depth occupies positive Y
//      - lowest tile point is exactly at Z=0

module vertical_tile() {

    translate(
        [
            0,
            peak_height,
            vertical_half_y
        ]
    )

    rotate([90, 0, 0])

    rotate([0, 0, vertical_edge_angle_deg])

        finished_tile();
}


// =============================================================================
// OPTIONAL BREAKAWAY VERTICAL FEET
// =============================================================================
//
// These are intentionally simple sacrificial tabs.
// They are added only in vertical export mode.
// Leave OFF unless a brim alone is not sufficient.

module vertical_breakaway_feet() {

    /*
        CONNECTED stabilizer feet.

        For flat-side-down vertical export, the bottom perimeter wall occupies
        approximately:

            Y = peak_height - edge_height  ...  peak_height

        and the bottom flat side spans roughly one hex-side length in X.

        The v25 feet were placed near Y=0 and too far outward in X, so they
        could become disconnected solids. v26 deliberately overlaps the
        actual bottom perimeter wall in both X and Y.

        The tabs extend only a few millimeters beyond the rear face, keeping
        Y-depth compact for multi-copy plate packing.
    */

    foot_center_x =
        hex_side_length * 0.30;

    // Safely inside the actual bottom flat-edge span.
    foot_length_x =
        min(
            vertical_foot_length_mm,
            hex_side_length * 0.25
        );

    // Bottom perimeter wall depth after the vertical transform.
    bottom_wall_y_min =
        peak_height - edge_height;

    bottom_wall_y_max =
        peak_height;

    // Extend a little toward the decorative face and a little behind the tile.
    foot_y_min =
        max(
            0,
            bottom_wall_y_min - 1.5
        );

    foot_y_max =
        bottom_wall_y_max + 3.0;

    attached_foot_depth =
        foot_y_max - foot_y_min;

    for (x = [-foot_center_x, foot_center_x]) {

        // Main shallow sacrificial pad.
        //
        // It overlaps the lower perimeter wall in volume, so CGAL produces
        // one connected body instead of merely touching at a plane.
        translate(
            [
                x - foot_length_x / 2,
                foot_y_min,
                0
            ]
        )
            cube(
                [
                    foot_length_x,
                    attached_foot_depth,
                    vertical_foot_height_mm
                ]
            );

        // Small reinforcing neck rising into the bottom perimeter wall.
        translate(
            [
                x - vertical_foot_neck_mm / 2,
                bottom_wall_y_min,
                0
            ]
        )
            cube(
                [
                    vertical_foot_neck_mm,
                    edge_height,
                    min(3.0, perimeter_wall_thickness_mm)
                ]
            );
    }
}



// =============================================================================
// AUTOMATIC VERTICAL ANTI-FLOAT GUSSETS
// =============================================================================
//
// These are sacrificial PRINTING AIDS.
//
// Each elevated mounting pad gets a thin triangular prism whose:
//   - upper tip overlaps the lowest pad corner
//   - lower/base edge overlaps the already-existing perimeter wall
//   - thickness lies only on the cavity side
//
// Because the support grows diagonally out of the shell, it avoids the long,
// free-standing vertical strips used in v27.
//
// The triangle is constructed directly in final print X/Z coordinates, then
// extruded a small amount in Y.

module xz_triangle_prism(p0, p1, p2, y0, thickness_y) {

    y1 = y0 + thickness_y;

    polyhedron(
        points = [
            [p0[0], y0, p0[1]],
            [p1[0], y0, p1[1]],
            [p2[0], y0, p2[1]],

            [p0[0], y1, p0[1]],
            [p1[0], y1, p1[1]],
            [p2[0], y1, p2[1]]
        ],

        faces = [
            [0, 2, 1],
            [3, 4, 5],

            [0, 1, 4, 3],
            [1, 2, 5, 4],
            [2, 0, 3, 5]
        ],

        convexity = 8
    );
}


module vertical_antifloat_gusset(angle_deg) {

    lowest_z = mount_lowest_z(angle_deg);
    lowest_x = mount_lowest_x(angle_deg);

    if (lowest_z > antifloat_min_height_mm) {

        // Choose a shell anchor below the first pad layer.
        anchor_z =
            max(
                0.40,
                lowest_z - antifloat_gusset_drop_mm
            );

        // Which side of the tile is the pad on?
        side_sign =
            lowest_x < 0 ? -1 : 1;

        // Anchor into the actual perimeter wall rather than floating in space.
        anchor_half_width =
            vertical_hex_half_width_at_z(anchor_z);

        anchor_x =
            side_sign
            * max(
                0,
                anchor_half_width
                - antifloat_gusset_wall_inset_mm
            );

        // Short vertical attachment edge against the perimeter wall.
        wall_base_z0 =
            max(
                0.20,
                anchor_z - antifloat_gusset_wall_base_mm / 2
            );

        wall_base_z1 =
            min(
                vertical_print_height - 0.20,
                anchor_z + antifloat_gusset_wall_base_mm / 2
            );

        // Move the gusset tip slightly into the pad, ensuring a true overlap
        // rather than a zero-thickness/tangent contact.
        tip_x =
            lowest_x
            - side_sign * antifloat_gusset_pad_overlap_mm;

        tip_z =
            lowest_z
            + antifloat_gusset_pad_overlap_mm;

        // Cavity-side Y position.
        //
        // The rear mounting pads occupy approximately:
        //   Y = peak_height - mount_pad_thickness_mm ... peak_height
        //
        // Put the gusset against the cavity-facing side of that pad.
        gusset_y =
            peak_height
            - mount_pad_thickness_mm;

        xz_triangle_prism(
            [anchor_x, wall_base_z0],
            [anchor_x, wall_base_z1],
            [tip_x, tip_z],
            gusset_y,
            antifloat_gusset_thickness_mm
        );
    }
}


module vertical_antifloat_gussets() {

    if (
        export_orientation == "vertical"
        && add_mount_pads
        && add_vertical_antifloat_gussets
    ) {
        for (a = mount_pad_angles)
            vertical_antifloat_gusset(a);
    }
}


// =============================================================================
// OUTPUT
// =============================================================================
//
// Default v29 exported STL target:
//   X ~ 240.00 mm  / 9.449 in
//   Y ~ relief depth (~17-19 mm depending on relief settings)
//   Z ~ 207.85 mm  / 8.183 in
//
// Multiple copies should be duplicated and arrayed along Y in the slicer.

module output_model() {

    if (export_orientation == "vertical") {

        union() {

            vertical_tile();

            if (add_vertical_breakaway_feet)
                vertical_breakaway_feet();

            vertical_antifloat_gussets();
        }

    } else {

        finished_tile();
    }
}

output_model();
